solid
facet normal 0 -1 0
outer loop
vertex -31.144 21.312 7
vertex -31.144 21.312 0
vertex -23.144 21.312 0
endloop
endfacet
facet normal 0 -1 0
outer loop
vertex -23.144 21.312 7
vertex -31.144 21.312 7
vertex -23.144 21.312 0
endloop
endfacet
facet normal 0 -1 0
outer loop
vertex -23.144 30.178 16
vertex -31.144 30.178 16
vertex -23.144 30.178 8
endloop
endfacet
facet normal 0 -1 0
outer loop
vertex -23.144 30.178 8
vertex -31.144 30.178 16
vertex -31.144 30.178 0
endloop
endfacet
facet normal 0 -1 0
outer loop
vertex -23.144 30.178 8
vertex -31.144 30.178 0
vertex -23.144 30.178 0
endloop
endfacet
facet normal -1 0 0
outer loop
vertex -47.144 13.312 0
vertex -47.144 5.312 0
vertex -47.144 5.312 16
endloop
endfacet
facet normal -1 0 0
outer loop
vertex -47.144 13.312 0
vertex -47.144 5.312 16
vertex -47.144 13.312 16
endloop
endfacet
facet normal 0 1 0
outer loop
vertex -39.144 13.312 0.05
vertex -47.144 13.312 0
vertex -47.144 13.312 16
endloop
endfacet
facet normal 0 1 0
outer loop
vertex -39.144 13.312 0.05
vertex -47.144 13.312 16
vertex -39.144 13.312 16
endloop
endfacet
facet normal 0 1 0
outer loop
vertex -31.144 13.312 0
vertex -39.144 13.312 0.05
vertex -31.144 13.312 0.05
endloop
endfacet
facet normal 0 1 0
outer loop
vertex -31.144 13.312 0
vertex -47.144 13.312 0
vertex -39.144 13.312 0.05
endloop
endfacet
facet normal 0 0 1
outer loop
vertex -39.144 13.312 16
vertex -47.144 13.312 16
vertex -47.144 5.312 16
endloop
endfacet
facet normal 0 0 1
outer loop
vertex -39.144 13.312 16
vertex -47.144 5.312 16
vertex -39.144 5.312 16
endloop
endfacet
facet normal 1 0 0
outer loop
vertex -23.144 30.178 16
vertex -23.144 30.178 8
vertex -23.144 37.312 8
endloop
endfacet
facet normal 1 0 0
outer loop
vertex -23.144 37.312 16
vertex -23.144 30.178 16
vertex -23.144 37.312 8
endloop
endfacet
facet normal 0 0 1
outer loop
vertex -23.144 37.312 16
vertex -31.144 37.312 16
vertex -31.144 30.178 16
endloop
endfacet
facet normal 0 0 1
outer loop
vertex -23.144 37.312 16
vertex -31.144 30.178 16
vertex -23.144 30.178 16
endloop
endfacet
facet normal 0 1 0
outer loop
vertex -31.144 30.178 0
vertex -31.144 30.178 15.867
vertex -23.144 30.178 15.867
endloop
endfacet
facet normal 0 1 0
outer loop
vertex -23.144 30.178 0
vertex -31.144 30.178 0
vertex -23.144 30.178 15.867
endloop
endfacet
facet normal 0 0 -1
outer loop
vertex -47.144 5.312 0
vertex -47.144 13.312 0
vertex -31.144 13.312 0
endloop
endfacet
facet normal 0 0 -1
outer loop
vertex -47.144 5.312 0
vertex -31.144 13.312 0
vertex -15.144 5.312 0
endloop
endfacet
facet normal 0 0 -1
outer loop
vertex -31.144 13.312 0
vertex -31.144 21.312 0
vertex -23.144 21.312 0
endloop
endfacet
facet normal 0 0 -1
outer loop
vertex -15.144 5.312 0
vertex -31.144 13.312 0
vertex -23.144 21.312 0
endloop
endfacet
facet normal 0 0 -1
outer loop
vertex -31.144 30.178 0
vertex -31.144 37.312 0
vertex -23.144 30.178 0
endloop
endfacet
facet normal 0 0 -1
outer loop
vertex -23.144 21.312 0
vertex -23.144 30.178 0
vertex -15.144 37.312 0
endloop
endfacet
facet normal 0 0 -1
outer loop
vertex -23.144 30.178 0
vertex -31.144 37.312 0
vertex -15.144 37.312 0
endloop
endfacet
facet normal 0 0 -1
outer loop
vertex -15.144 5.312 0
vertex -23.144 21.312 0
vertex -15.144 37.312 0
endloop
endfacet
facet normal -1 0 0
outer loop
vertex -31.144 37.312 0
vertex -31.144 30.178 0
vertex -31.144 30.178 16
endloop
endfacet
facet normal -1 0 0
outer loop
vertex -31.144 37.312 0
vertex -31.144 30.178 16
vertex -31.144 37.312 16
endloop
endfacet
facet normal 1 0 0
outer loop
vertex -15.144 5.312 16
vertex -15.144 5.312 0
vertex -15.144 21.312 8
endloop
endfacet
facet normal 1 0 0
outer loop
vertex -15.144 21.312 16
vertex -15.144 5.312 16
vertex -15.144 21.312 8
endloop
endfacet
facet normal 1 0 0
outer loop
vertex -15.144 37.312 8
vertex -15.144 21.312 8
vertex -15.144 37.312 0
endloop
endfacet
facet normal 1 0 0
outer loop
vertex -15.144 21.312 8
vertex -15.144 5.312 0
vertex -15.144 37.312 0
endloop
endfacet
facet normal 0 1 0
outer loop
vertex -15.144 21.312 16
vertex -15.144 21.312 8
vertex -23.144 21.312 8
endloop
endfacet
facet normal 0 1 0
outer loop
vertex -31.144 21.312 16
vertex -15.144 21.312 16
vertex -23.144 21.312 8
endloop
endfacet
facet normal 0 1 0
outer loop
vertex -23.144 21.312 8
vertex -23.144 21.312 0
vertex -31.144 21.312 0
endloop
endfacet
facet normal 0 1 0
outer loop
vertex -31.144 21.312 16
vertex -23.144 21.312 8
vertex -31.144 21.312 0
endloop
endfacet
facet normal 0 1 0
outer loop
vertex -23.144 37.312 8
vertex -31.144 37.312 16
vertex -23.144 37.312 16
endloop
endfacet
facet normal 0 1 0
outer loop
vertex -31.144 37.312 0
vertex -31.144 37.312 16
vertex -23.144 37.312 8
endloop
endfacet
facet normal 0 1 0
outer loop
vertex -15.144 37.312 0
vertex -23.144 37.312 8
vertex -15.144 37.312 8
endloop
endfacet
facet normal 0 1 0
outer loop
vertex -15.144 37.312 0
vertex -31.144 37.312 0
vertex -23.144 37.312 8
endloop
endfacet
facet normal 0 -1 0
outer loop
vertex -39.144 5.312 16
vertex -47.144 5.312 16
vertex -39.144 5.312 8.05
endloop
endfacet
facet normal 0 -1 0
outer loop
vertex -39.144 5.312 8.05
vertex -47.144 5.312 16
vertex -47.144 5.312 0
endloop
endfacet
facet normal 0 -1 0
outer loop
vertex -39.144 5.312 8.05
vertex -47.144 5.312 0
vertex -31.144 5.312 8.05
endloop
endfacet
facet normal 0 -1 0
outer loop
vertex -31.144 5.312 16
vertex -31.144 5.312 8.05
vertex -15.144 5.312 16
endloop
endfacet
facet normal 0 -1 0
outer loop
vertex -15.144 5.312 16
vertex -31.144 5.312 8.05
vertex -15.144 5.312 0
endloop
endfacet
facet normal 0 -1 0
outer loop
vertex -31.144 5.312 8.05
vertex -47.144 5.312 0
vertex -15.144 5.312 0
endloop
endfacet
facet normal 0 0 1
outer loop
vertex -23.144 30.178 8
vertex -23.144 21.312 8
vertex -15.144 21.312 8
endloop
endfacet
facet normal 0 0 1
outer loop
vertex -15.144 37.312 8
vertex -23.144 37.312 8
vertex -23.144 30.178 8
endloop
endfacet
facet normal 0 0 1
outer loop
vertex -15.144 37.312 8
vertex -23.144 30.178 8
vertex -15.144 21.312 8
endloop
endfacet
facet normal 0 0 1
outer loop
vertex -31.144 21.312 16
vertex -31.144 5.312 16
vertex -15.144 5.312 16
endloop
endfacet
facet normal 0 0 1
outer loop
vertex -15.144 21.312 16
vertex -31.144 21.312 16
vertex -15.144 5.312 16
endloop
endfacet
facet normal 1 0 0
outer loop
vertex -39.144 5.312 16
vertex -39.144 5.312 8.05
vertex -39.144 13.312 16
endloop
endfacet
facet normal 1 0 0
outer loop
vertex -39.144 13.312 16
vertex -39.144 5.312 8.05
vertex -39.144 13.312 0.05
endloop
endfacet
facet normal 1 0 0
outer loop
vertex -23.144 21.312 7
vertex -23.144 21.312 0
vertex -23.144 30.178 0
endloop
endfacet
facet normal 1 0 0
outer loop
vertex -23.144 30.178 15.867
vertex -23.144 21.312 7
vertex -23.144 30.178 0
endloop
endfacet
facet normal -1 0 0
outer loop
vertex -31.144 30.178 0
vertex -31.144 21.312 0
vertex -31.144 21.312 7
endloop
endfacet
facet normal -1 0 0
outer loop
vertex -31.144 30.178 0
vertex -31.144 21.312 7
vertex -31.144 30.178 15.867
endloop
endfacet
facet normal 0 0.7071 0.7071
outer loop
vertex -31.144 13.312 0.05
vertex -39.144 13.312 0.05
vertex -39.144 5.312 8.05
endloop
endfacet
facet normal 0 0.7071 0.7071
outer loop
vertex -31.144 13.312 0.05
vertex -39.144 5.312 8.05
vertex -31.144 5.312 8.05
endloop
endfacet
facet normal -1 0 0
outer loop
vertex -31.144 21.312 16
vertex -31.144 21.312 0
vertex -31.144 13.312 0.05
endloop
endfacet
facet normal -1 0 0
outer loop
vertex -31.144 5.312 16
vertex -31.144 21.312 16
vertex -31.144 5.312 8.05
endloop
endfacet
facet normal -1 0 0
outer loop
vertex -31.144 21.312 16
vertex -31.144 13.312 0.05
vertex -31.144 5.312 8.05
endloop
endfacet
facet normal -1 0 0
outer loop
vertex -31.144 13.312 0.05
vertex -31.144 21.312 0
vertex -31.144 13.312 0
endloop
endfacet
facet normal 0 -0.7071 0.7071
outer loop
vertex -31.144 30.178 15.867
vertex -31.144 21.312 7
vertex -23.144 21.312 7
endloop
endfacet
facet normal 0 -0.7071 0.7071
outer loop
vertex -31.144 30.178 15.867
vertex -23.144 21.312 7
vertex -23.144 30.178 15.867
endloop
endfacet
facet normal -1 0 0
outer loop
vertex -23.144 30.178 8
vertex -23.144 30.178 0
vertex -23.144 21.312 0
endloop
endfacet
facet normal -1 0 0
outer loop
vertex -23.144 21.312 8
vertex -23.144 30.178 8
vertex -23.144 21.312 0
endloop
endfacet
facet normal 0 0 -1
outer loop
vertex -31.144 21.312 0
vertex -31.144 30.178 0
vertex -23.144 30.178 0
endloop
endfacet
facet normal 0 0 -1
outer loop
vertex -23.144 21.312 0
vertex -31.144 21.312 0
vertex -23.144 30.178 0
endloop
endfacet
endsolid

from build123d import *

# Parameters (mm, degrees)
F0_W        = 8
F0_H        = 8
F1_DEPTH    = 8.05
F2_DEPTH    = 16
F3_SIZE     = 7.99999
F4_DEPTH    = 16
F5_DEPTH    = 8
F0_H_2      = 7.1334964926
F6_DEPTH    = 16
F0_H_3      = 8.8665035074
F7_DEPTH    = 16
F8_T1_DEPTH = 54.2902937834


# Not quite as in the source:
# - a fillet or chamfer that OpenCascade refuses, or shapes differently, is made with other operations: its cross-section is extruded or revolved along the edge and cut away or added
# - a fillet or chamfer is up to 0.001 mm smaller than in the source, because OpenCascade refuses the exact size


with BuildPart() as f1:
    # F0 (on Top) → F1 (new body)
    with BuildSketch(Plane.XY):
        with Locations((-35.1440954627, 9.3118814863)):
            Rectangle(F0_W, F0_H)
    extrude(amount=F1_DEPTH)

    # F0 (on Top) → F2 (join)
    with BuildSketch(Plane.XY):
        Polygon((-23.1440954627, 21.3118814863), (-31.1440954627, 21.3118814863), (-31.1440954627, 13.3118814863), (-31.1440954627, 5.3118814863), (-15.1440954627, 5.3118814863), (-15.1440954627, 21.3118814863), align=None)
    extrude(amount=F2_DEPTH)

    # F3 (size 8 in the source; OpenCascade refuses exactly that, so slightly less here)
    f3_edges = [f1.edges().sort_by_distance(p)[0] for p in [
        (-35.144095, 13.311881, 8.05),
    ]]
    chamfer(f3_edges, length=F3_SIZE)

    # F0 (on Top) → F4 (join)
    with BuildSketch(Plane.XY):
        with Locations((-43.1440954627, 9.3118814863)):
            Rectangle(F0_W, F0_H)
    extrude(amount=F4_DEPTH)

    # F0 (on Top) → F5 (join)
    with BuildSketch(Plane.XY):
        Polygon((-15.1440954627, 37.3118814863), (-23.1440954627, 37.3118814863), (-23.1440954627, 30.1783849937), (-23.1440954627, 21.3118814863), (-15.1440954627, 21.3118814863), align=None)
    extrude(amount=F5_DEPTH)

    # F0 (on Top) → F6 (join)
    with BuildSketch(Plane.XY):
        with Locations((-27.1440954627, 33.74513324)):
            Rectangle(F0_W, F0_H_2)
    extrude(amount=F6_DEPTH)


with BuildPart() as f7:
    # F0 (on Top) → F7 (new body)
    with BuildSketch(Plane.XY):
        with Locations((-27.1440954627, 25.74513324)):
            Rectangle(F0_W, F0_H_3)
    extrude(amount=F7_DEPTH)

    # F8: chamfer of 9 on 1 edges, made by hand

    # F8_s2 → F8_t1 (cut)
    with BuildSketch(Plane.YZ.offset(-54.2892423544)):
        Polygon((21.3118814863, 7), (30.3118814863, 16), (21.3118814863, 16), align=None)
    extrude(amount=F8_T1_DEPTH, mode=Mode.SUBTRACT)


solid = Compound([f1.part, f7.part])
